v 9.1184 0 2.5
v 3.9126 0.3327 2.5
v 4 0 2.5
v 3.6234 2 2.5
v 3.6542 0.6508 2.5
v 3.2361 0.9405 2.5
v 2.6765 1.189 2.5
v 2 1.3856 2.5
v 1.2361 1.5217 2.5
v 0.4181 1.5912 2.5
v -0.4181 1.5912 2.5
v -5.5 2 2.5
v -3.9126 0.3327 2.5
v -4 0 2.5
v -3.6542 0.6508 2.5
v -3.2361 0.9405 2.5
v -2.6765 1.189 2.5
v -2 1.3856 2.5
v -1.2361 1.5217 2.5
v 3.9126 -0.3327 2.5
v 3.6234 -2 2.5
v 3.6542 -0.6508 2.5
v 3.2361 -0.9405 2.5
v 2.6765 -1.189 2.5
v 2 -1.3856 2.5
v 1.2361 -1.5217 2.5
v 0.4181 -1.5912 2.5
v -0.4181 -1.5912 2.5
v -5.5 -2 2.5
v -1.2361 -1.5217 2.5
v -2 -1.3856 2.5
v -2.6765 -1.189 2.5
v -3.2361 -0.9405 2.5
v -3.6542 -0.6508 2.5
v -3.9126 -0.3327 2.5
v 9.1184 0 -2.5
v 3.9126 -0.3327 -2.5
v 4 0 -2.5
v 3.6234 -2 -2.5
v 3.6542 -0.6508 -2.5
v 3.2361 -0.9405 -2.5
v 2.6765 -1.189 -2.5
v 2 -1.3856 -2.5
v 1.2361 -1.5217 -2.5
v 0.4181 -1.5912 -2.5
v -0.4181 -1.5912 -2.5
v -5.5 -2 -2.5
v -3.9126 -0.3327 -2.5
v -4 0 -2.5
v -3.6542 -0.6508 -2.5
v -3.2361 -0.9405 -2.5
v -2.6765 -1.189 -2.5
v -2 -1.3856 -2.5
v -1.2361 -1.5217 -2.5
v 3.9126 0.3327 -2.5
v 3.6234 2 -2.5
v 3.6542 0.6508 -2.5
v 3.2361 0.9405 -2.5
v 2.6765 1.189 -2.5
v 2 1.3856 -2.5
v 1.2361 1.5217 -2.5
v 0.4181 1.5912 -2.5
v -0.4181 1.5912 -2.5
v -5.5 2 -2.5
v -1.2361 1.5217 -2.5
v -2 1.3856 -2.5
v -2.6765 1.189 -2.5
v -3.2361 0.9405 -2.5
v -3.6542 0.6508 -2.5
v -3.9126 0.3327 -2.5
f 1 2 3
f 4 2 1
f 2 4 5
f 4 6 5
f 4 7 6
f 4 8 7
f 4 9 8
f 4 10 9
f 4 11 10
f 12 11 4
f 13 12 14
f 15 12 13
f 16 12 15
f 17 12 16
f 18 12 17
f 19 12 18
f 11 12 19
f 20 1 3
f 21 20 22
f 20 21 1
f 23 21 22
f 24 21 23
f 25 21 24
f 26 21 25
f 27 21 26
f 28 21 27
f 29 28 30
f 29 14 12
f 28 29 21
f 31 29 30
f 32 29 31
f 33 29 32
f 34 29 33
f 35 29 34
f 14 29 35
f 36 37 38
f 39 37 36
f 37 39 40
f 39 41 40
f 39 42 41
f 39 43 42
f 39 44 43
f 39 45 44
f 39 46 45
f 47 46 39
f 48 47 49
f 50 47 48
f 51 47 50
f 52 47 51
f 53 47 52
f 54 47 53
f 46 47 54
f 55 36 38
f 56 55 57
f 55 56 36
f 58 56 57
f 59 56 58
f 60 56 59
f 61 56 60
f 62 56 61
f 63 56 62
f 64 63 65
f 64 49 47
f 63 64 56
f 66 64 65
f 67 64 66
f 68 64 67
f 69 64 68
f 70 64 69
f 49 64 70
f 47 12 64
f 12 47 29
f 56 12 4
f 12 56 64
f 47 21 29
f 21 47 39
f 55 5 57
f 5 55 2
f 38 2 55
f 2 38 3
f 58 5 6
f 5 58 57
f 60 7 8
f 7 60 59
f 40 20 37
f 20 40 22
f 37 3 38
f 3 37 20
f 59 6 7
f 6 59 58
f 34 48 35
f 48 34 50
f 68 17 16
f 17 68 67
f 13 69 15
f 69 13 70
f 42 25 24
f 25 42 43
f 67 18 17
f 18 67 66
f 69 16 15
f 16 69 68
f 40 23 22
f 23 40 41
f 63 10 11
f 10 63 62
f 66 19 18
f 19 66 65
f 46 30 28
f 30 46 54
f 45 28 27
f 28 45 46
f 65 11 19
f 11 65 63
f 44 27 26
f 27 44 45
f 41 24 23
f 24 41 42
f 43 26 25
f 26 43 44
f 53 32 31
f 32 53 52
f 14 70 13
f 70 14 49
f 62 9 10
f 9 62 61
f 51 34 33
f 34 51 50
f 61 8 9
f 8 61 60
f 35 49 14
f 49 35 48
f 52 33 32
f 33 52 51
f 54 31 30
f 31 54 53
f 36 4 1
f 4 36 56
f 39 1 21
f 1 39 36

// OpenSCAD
difference (){
difference (){
translate ([2, 0, 0]) scale([1, 0.8, 1]) cube ([15, 5, 5], center=true);
scale([2, 0.8, 1]) {cylinder( r=2, h=5+1, center=true, $fn=30);}
}
translate ([2,0,0]) union(){
translate ([8, 5, 0]) rotate ([0, 0, 160])  cube (10, center=true);
translate ([8, -5, 0]) rotate ([0, 0, -160])  cube (10, center=true);
    }
}
